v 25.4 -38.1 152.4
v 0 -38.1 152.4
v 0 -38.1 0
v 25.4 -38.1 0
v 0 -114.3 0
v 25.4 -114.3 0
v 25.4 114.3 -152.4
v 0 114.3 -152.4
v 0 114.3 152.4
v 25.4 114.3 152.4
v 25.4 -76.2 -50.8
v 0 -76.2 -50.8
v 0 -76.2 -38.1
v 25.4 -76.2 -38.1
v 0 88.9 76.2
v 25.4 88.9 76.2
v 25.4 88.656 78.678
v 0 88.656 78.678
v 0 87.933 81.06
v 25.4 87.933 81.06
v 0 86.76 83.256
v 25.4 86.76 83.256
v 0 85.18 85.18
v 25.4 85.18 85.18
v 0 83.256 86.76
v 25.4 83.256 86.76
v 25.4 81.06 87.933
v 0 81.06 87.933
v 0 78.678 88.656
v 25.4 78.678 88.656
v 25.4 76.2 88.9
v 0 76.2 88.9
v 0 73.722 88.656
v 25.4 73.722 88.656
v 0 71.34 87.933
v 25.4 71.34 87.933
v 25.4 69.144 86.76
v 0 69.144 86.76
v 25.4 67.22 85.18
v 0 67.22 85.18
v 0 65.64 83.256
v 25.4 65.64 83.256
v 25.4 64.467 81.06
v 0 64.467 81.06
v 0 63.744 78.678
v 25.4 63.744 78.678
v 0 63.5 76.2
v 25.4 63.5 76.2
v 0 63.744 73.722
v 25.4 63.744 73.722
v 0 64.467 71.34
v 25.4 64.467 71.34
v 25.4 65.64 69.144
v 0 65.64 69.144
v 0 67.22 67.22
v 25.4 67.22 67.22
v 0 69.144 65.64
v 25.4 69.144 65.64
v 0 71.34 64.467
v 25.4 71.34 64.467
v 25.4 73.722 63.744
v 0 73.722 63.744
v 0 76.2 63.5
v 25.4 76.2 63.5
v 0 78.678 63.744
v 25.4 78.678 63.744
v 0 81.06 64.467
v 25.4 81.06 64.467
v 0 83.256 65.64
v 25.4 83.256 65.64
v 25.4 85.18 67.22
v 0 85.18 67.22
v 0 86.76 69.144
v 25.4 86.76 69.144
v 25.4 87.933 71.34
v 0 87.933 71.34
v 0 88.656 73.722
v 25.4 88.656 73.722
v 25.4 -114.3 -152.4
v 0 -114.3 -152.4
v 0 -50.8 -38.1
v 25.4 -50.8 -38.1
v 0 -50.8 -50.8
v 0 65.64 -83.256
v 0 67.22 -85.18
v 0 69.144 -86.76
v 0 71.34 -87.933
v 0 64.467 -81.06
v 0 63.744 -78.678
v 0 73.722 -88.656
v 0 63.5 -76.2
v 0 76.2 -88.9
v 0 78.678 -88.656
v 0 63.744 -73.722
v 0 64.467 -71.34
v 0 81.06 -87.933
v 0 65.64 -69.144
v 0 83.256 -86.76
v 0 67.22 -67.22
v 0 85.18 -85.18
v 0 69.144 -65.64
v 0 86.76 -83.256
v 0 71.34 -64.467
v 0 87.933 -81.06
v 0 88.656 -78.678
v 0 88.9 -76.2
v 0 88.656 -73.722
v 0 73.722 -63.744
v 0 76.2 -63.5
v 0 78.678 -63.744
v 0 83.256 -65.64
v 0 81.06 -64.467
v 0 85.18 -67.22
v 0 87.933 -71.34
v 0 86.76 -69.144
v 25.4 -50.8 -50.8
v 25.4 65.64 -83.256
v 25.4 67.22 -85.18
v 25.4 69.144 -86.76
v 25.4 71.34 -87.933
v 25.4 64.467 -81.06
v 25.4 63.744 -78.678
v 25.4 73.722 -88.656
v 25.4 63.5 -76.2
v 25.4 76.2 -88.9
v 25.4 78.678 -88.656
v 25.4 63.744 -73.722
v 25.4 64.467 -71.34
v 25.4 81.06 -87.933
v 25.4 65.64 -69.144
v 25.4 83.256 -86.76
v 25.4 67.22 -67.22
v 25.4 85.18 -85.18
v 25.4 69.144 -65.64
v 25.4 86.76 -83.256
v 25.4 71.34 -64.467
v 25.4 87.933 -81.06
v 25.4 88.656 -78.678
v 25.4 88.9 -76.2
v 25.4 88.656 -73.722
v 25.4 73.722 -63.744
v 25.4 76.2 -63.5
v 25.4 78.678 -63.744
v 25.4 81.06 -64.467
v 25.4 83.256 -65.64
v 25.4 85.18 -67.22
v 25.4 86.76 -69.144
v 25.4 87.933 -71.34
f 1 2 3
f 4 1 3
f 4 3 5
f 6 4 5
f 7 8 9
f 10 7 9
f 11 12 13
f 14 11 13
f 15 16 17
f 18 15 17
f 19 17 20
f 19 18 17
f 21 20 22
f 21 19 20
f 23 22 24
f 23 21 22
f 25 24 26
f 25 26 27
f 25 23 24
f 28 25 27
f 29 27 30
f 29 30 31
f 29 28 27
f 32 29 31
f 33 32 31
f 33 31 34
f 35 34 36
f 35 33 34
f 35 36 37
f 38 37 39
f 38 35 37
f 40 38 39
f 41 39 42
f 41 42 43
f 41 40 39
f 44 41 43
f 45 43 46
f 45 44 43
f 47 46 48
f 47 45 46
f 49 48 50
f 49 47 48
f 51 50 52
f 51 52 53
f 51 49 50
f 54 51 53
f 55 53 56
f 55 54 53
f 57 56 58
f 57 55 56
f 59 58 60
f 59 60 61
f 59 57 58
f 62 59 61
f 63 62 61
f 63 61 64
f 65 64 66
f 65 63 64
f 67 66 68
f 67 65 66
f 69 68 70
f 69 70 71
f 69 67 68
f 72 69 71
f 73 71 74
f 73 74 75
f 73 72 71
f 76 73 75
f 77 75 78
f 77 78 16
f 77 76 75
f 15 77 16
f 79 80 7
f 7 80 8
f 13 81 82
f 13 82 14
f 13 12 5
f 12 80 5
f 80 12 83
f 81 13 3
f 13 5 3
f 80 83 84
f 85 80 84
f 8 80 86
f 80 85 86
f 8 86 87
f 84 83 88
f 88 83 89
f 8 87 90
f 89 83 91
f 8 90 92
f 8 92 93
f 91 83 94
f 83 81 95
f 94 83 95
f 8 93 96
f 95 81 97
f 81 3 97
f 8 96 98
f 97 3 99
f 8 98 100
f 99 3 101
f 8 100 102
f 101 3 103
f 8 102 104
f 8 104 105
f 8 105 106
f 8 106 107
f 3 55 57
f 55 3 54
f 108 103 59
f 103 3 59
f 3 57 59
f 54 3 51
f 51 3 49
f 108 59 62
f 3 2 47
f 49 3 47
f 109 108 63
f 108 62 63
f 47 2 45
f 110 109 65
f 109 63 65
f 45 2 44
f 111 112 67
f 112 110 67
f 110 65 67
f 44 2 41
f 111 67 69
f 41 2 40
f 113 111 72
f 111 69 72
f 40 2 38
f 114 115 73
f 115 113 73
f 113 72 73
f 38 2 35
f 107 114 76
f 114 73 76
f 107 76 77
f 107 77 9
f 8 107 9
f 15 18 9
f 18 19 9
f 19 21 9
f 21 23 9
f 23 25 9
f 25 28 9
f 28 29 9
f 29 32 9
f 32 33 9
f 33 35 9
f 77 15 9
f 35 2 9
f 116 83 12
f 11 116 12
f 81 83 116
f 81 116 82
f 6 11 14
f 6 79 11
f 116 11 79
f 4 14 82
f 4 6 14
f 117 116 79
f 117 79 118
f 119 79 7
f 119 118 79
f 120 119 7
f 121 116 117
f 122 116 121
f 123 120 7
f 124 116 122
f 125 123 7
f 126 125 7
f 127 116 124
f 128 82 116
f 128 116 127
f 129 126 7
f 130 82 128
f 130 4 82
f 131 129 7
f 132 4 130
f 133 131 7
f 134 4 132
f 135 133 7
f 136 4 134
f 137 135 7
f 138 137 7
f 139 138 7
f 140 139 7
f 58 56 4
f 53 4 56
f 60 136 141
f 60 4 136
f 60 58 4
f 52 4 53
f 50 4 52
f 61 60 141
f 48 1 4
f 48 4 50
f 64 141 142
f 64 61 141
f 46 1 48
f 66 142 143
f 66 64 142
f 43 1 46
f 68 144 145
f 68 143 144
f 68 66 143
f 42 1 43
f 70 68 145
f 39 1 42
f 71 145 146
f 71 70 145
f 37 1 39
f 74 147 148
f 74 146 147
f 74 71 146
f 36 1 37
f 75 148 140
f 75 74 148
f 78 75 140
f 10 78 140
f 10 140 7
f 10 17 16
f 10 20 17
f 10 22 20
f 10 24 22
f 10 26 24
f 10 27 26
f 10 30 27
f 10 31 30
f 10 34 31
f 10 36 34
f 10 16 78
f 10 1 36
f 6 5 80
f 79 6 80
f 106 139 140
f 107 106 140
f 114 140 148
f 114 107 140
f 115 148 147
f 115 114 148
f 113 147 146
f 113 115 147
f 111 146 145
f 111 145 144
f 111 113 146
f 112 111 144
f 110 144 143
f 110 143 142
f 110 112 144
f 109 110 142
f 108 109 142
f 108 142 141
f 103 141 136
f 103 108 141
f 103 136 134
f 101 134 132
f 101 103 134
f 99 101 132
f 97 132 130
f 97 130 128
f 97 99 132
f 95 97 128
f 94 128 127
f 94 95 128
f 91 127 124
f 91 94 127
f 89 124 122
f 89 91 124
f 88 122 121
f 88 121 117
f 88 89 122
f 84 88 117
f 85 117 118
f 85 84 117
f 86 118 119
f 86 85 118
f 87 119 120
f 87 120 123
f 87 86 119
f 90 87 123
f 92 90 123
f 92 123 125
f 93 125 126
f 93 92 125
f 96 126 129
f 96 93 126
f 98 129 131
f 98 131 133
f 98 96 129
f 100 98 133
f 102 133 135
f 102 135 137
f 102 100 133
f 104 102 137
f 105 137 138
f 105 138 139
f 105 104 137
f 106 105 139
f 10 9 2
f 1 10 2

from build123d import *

# Parameters (mm, degrees)
F0_R     = 12.7
F1_DEPTH = 25.4
F2_W     = 25.4
F2_H     = 12.7
F3_DEPTH = 25.4


with BuildPart() as f1:
    # F0 (on Right) → F1 (new body)
    with BuildSketch(Plane.YZ):
        Polygon((114.3, -152.4), (114.3, 152.4), (-38.1, 152.4), (-38.1, 0), (-114.3, 0), (-114.3, -152.4), align=None)
        with Locations((76.2, -76.2)):
            Circle(F0_R, mode=Mode.SUBTRACT)
        with Locations((76.2, 76.2)):
            Circle(F0_R, mode=Mode.SUBTRACT)
    extrude(amount=F1_DEPTH)

    # F2 (on face) → F3 (cut)
    with BuildSketch(Plane(origin=(0, 0, 0), x_dir=(0, -1, 0), z_dir=(-1, 0, 0))):
        with Locations((63.5, -44.45)):
            Rectangle(F2_W, F2_H)
    extrude(amount=-F3_DEPTH, mode=Mode.SUBTRACT)


solid = f1.part
